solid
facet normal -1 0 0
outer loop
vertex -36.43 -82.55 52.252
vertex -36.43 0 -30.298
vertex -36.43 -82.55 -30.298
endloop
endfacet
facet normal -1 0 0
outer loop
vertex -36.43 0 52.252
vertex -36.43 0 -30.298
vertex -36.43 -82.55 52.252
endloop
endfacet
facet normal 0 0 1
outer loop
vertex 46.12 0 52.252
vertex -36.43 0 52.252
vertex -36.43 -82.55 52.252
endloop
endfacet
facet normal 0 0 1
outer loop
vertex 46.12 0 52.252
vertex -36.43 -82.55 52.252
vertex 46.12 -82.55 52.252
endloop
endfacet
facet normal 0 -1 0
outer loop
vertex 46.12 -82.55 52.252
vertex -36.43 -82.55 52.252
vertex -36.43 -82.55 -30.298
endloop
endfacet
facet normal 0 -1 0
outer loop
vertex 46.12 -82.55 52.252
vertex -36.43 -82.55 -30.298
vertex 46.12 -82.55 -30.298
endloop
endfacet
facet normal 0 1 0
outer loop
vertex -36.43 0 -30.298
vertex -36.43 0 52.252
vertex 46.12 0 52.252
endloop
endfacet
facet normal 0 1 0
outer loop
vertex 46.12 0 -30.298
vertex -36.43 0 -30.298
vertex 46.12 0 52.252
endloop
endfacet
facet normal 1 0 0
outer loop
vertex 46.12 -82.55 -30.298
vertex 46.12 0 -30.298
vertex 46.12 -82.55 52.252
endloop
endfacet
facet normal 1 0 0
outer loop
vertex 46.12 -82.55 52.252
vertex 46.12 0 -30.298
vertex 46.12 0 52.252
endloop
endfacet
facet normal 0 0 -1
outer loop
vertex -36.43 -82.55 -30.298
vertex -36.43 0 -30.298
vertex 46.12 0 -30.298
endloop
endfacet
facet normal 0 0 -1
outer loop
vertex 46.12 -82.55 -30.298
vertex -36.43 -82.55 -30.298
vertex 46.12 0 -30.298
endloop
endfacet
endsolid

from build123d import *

# Parameters (mm, degrees)
F0_W      = 82.55
F0_H      = 82.55
F1_DEPTH  = 82.55
F2_R      = 19.086934
F3_DEPTH  = 25.4
F3_FACE_R = 19.086934
F4_DEPTH  = 25.4


with BuildPart() as f1:
    # F0 (on Front) → F1 (new body)
    with BuildSketch(Plane.XZ):
        with Locations((4.84459, 10.976995)):
            Rectangle(F0_W, F0_H)
    extrude(amount=F1_DEPTH)

    # F2 (on face) → F3 (cut)
    with BuildSketch(Plane.XZ.offset(82.55)):
        with Locations((3.240283, 11.269498)):
            Circle(F2_R)
    extrude(amount=-F3_DEPTH, mode=Mode.SUBTRACT)

    # F3_face (on face) → F4 (join)
    with BuildSketch(Plane(origin=(3.240283, -57.15, 11.269498), x_dir=(1, 0, 0), z_dir=(0, -1, 0))):
        Circle(F3_FACE_R)
    extrude(amount=F4_DEPTH)


solid = f1.part
